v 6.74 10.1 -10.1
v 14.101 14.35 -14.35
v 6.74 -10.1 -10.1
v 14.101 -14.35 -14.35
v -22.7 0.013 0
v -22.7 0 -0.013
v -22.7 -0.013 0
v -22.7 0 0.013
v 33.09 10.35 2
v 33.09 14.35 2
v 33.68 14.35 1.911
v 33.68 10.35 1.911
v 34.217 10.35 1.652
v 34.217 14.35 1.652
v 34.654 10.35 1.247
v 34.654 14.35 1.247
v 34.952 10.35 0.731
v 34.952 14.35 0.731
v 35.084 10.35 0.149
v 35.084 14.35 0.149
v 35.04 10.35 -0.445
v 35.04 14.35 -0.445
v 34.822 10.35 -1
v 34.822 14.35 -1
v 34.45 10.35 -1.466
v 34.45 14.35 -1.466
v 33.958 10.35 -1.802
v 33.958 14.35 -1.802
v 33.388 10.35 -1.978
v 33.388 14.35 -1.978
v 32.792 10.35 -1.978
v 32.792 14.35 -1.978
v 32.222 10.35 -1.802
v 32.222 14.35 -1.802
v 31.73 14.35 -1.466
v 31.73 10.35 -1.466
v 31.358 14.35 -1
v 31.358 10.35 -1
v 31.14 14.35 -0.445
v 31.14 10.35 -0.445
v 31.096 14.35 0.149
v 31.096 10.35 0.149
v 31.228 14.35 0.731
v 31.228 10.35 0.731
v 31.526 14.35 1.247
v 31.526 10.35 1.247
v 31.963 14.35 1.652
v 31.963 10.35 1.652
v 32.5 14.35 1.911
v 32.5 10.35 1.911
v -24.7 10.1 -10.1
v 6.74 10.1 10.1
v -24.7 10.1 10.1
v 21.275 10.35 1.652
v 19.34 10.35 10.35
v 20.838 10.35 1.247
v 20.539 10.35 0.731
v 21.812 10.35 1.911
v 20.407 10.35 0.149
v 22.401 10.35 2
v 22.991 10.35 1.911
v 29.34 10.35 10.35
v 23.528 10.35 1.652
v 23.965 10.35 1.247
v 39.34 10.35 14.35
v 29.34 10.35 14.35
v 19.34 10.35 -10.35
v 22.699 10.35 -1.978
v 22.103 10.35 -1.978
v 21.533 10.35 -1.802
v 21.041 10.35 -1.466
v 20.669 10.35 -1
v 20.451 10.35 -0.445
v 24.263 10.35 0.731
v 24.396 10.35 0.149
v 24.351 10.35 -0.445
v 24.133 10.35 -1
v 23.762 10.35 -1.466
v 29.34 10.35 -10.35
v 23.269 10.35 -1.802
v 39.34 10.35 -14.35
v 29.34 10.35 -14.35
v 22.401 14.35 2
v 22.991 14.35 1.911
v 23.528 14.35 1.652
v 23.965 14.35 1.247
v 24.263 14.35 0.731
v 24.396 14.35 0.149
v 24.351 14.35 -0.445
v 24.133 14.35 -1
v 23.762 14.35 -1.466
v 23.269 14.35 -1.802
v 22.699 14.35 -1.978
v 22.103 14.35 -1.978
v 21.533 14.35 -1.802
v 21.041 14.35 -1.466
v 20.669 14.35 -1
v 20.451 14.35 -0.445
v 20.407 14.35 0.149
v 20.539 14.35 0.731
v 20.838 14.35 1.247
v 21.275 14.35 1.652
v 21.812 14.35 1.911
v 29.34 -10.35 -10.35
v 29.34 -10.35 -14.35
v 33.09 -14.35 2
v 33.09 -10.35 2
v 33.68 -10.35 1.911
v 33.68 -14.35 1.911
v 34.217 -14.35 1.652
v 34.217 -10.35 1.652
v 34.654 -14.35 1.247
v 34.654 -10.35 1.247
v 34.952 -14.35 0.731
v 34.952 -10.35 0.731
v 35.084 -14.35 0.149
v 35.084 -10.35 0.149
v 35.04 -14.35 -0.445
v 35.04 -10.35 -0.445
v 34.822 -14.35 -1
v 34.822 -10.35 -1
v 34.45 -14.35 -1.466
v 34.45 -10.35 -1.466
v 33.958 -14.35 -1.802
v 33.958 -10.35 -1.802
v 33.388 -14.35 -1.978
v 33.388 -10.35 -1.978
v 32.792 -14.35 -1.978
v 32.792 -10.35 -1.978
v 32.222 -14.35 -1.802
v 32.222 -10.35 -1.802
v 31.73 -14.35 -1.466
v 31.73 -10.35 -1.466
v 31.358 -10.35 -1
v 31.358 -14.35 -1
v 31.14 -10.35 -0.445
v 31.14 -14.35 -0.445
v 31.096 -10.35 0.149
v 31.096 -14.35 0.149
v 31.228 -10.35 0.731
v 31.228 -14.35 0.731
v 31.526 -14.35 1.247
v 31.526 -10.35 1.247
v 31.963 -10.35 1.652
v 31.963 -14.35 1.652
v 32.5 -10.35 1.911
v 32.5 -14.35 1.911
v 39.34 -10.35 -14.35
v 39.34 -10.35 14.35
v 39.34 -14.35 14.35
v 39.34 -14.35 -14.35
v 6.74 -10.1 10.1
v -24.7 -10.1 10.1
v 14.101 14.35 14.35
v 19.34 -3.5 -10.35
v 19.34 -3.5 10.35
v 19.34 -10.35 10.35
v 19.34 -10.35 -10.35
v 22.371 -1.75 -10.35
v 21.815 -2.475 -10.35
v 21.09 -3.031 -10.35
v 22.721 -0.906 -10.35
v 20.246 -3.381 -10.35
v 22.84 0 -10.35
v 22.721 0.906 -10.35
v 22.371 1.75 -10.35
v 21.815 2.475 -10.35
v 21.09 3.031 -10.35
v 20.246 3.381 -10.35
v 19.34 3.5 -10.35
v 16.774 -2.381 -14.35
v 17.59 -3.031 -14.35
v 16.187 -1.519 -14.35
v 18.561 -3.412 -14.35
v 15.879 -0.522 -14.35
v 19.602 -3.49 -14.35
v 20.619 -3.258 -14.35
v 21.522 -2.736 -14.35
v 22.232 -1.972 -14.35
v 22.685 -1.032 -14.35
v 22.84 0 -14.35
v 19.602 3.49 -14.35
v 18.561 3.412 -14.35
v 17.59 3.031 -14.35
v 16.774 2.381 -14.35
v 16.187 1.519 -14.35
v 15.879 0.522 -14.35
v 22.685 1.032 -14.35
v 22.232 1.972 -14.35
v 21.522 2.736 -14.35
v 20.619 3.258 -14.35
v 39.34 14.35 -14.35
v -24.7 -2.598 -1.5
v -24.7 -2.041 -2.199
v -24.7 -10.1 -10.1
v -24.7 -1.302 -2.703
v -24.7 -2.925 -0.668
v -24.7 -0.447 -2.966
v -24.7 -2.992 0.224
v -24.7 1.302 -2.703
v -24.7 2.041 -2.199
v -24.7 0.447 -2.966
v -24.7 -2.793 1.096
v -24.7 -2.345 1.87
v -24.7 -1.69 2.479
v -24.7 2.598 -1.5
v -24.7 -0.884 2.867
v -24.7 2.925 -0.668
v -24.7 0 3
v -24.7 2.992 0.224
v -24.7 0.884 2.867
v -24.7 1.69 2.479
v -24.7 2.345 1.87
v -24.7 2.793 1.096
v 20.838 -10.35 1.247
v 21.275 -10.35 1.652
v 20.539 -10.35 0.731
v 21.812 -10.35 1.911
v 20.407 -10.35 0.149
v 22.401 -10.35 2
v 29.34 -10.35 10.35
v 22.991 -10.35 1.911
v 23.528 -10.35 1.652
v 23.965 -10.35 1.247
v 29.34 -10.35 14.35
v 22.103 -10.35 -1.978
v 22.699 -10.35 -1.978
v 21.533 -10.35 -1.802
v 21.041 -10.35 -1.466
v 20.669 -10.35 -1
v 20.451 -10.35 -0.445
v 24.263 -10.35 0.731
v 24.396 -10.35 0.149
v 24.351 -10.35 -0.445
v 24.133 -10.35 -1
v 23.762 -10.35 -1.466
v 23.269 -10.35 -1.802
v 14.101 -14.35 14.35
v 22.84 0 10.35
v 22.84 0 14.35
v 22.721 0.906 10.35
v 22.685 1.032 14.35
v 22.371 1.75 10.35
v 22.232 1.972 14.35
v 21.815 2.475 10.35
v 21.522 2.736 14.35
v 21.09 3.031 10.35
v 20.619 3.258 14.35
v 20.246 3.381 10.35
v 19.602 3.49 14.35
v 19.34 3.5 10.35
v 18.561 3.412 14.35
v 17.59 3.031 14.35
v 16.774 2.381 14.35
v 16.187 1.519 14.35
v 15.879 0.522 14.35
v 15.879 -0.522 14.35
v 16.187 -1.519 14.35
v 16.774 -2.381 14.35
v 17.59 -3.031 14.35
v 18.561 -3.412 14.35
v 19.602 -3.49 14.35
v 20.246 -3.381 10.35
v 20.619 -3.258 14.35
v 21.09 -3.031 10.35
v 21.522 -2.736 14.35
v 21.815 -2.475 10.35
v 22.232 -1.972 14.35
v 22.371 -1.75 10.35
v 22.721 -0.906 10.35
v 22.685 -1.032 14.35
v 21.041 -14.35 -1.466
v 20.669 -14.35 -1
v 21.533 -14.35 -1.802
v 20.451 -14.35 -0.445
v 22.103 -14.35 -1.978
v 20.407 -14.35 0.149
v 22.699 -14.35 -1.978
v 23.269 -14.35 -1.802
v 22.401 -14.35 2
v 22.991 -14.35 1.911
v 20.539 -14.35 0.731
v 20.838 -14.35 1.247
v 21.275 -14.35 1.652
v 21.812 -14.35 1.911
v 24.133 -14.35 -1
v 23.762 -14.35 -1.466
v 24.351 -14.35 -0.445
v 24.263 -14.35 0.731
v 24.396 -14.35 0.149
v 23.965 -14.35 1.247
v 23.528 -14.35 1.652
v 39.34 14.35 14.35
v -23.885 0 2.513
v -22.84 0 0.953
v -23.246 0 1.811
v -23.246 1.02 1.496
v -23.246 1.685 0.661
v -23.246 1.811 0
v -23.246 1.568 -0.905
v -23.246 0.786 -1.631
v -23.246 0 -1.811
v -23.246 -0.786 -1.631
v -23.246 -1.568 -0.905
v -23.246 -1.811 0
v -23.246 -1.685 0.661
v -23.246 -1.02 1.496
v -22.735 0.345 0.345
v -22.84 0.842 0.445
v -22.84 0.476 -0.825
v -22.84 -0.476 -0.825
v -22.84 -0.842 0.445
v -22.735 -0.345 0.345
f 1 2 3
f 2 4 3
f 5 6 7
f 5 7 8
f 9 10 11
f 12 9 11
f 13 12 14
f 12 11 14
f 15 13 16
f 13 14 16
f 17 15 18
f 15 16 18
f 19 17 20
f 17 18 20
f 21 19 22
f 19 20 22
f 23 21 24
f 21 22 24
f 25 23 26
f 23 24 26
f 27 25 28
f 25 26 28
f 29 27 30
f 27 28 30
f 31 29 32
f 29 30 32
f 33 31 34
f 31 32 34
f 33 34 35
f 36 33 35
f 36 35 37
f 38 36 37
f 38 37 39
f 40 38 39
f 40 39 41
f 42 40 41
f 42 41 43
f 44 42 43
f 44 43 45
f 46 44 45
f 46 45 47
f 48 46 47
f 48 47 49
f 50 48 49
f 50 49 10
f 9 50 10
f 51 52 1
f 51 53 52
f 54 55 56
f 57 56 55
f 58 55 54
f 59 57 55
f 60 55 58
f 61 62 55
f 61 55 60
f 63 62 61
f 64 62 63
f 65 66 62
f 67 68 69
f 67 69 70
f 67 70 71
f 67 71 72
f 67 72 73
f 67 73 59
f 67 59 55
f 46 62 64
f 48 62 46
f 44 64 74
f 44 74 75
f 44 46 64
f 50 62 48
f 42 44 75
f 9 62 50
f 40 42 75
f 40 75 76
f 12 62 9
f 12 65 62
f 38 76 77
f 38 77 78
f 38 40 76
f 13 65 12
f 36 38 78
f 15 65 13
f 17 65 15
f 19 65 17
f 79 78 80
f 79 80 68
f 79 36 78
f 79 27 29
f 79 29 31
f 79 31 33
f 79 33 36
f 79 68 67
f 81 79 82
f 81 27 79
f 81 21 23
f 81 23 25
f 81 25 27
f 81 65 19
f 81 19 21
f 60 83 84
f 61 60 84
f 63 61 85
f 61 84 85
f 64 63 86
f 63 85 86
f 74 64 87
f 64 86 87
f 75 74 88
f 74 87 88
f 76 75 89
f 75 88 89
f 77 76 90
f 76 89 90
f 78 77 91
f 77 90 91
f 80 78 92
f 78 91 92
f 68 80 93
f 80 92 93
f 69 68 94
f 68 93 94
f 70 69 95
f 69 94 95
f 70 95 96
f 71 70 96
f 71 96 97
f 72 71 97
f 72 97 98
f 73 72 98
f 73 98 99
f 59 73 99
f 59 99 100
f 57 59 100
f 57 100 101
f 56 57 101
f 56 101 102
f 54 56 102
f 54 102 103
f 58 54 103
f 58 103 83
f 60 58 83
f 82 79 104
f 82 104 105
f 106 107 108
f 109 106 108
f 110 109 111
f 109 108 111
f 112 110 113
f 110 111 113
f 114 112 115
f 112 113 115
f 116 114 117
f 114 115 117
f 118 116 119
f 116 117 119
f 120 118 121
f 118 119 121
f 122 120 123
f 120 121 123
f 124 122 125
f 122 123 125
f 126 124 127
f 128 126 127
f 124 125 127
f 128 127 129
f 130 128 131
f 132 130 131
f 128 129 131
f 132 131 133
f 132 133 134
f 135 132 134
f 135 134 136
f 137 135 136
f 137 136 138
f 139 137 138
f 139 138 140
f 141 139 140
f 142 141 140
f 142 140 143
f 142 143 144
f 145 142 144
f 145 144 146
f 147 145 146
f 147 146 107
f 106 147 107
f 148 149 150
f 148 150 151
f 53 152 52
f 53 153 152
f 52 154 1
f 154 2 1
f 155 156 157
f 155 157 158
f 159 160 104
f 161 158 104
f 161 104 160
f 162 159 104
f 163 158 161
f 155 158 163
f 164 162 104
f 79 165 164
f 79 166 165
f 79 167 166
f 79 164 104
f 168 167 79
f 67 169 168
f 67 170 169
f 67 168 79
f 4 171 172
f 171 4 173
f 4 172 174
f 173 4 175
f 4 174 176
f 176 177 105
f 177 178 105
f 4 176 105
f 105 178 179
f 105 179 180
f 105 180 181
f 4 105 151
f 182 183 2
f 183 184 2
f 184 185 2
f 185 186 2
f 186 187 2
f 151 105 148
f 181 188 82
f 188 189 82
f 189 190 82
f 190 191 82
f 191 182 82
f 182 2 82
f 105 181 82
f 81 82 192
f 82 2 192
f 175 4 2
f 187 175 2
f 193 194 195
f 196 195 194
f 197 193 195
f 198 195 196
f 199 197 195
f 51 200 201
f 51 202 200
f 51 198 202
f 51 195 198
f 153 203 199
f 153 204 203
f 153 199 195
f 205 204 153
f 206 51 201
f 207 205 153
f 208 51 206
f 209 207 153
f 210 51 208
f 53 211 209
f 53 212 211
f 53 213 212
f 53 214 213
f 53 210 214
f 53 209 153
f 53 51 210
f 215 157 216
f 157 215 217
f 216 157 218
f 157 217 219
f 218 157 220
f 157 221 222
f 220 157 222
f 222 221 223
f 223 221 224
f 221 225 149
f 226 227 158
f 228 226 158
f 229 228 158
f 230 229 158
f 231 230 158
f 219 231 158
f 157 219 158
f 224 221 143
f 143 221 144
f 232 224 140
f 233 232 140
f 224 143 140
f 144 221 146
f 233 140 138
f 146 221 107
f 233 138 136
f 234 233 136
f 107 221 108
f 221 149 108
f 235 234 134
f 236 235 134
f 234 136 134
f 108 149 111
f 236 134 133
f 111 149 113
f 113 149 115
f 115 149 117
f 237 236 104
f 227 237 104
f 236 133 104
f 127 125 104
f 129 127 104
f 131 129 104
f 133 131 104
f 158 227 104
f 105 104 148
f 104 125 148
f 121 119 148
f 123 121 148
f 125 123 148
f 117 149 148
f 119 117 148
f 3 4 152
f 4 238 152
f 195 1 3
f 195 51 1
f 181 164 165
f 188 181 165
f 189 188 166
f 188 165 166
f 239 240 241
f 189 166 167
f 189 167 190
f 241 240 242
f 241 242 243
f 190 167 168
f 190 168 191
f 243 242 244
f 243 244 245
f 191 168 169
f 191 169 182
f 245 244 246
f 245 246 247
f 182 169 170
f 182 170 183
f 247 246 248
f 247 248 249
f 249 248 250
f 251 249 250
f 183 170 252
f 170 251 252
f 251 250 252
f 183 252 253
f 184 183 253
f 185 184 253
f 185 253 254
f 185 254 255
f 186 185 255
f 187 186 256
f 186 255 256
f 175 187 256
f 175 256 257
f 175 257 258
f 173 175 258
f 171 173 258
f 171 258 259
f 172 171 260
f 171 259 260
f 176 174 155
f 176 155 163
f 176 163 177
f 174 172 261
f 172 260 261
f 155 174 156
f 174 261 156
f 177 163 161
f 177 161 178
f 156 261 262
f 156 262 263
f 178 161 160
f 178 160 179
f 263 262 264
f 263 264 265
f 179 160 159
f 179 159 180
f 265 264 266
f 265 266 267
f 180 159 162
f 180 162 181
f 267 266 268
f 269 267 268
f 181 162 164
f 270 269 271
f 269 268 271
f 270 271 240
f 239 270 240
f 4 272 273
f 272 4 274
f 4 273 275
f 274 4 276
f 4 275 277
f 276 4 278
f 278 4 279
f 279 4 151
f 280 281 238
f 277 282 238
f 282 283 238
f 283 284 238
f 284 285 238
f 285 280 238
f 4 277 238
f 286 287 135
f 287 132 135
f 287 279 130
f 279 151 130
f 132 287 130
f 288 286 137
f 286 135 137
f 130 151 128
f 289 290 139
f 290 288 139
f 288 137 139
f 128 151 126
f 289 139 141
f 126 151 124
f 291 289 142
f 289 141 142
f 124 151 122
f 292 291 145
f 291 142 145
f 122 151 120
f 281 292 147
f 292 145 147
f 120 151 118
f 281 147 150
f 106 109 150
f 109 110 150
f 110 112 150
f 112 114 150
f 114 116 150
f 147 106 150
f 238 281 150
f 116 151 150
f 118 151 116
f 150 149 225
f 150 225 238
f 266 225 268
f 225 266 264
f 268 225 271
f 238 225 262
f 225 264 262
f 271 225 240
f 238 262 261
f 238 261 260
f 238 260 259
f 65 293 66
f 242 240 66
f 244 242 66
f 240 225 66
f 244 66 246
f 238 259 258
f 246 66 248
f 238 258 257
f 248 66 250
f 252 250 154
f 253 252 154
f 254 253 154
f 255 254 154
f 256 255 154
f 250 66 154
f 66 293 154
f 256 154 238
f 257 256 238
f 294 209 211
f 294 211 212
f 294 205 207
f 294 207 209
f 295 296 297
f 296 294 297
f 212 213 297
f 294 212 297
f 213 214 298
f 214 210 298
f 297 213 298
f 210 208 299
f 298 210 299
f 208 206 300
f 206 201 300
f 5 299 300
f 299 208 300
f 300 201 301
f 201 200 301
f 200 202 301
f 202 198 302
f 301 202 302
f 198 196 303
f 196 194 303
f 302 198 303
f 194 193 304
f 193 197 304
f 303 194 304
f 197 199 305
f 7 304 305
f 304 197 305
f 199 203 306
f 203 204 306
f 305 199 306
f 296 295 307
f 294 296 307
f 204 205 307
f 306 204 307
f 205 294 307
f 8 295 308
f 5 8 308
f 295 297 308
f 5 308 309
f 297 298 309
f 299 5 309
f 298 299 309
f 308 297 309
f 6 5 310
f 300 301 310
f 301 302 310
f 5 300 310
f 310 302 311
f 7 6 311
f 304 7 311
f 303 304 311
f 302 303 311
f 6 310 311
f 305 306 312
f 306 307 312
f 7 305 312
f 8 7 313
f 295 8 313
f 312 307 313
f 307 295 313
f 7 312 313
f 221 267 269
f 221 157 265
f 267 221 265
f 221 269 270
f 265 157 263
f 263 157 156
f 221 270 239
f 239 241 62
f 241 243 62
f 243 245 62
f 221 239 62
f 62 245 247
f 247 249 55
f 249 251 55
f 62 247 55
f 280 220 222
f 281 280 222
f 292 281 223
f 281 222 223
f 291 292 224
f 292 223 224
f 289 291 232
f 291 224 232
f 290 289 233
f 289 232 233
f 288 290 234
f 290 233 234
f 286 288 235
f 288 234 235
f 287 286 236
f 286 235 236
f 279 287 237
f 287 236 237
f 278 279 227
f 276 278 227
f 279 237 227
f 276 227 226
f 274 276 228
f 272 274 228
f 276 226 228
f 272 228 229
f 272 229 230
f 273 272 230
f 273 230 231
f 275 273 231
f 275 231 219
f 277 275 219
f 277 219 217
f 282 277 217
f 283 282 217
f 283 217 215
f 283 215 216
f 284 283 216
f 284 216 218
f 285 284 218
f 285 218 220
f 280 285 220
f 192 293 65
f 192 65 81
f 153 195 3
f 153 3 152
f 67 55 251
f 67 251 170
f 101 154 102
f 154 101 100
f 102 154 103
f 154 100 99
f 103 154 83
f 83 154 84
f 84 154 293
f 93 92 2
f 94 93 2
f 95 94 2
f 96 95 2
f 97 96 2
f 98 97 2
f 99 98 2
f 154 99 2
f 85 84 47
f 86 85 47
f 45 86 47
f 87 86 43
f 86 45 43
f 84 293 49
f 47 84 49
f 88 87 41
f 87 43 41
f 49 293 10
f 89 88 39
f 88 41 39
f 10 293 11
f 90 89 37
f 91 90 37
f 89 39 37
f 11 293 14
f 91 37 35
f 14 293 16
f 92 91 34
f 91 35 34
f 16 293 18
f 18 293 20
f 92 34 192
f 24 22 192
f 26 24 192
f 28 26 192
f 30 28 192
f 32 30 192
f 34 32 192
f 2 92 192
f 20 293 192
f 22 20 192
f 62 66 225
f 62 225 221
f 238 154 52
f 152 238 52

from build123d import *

# Parameters (mm, degrees)
SKETCH1_W                 = 20
SKETCH1_H                 = 20
BOSS_EXTRUDE1_DEPTH       = 20
SKETCH2_W                 = 20
SKETCH2_H                 = 40.2
BOSS_EXTRUDE2_DEPTH       = 64.7
SKETCH3_W                 = 40.9
SKETCH3_H                 = 20.8
CUT_EXTRUDE1_DEPTH        = 90.320210479
SKETCH4_W                 = 11.9
SKETCH4_H                 = 40.2
CUT_EXTRUDE2_DEPTH        = 90.320210479
SKETCH5_R                 = 2.35
CUT_EXTRUDE3_DEPTH        = 10
SKETCH6_R                 = 2.35
CUT_EXTRUDE4_DEPTH        = 10
CHAMFER1_SIZE             = 1
SKETCH7_W                 = 20
SKETCH7_H                 = 10.1
BOSS_EXTRUDE4_DEPTH       = 4.7
SKETCH9_W                 = 20
SKETCH9_H                 = 20
BOSS_EXTRUDE5_DEPTH       = 24.7
SKETCH10_R                = 3
CUT_EXTRUDE5_DEPTH        = 2
FILLET1_R                 = 3.23
SKETCH11_W                = 20.2
SKETCH11_H                = 20.2
SKETCH11_W_2              = 20
SKETCH11_H_2              = 20
BOSS_EXTRUDE6_DEPTH       = 40
SKETCH12_R                = 3.35
BOSS_EXTRUDE7_DEPTH       = 0.1
BOSS_EXTRUDE8_DEPTH       = 0.1
SKETCH14_W                = 27.84115355
SKETCH14_H                = 50.628320261
CUT_EXTRUDE6_DEPTH        = 57.5
BOSS_EXTRUDE10_DEPTH      = 10
BOSS_EXTRUDE10_DEPTH_BACK = 0.96
SKETCH18_W                = 28.7
SKETCH18_H                = 28.7
SKETCH18_W_2              = 20.7
SKETCH18_H_2              = 20.7
SKETCH19_W                = 20.7
SKETCH19_H                = 20.7
BOSS_EXTRUDE11_DEPTH      = 4.04
SKETCH21_W                = 20.7
SKETCH21_H                = 20.7
BOSS_EXTRUDE13_DEPTH      = 0.96
SKETCH22_W                = 28.7
SKETCH22_H                = 28.7
SKETCH22_W_2              = 20.7
SKETCH22_H_2              = 20.7
BOSS_EXTRUDE14_DEPTH      = 14.04
CHAMFER2_SIZE             = 4.387862046
CHAMFER2_SIZE_2           = 7.6
SKETCH24_R                = 3.5
CUT_EXTRUDE7_DEPTH        = 51.76660418
SKETCH25_W                = 4
SKETCH25_H                = 20.7
CUT_EXTRUDE8_DEPTH        = 10
SKETCH26_R                = 2
CUT_EXTRUDE9_DEPTH        = 51.76660418


with BuildPart() as part:
    # Sketch1 → Boss-Extrude1 (new body)
    with BuildSketch(Plane(origin=(0, 0, 0), x_dir=(0, 0, -1), z_dir=(1, 0, 0))):
        Rectangle(SKETCH1_W, SKETCH1_H)
    extrude(amount=BOSS_EXTRUDE1_DEPTH)

    # Sketch2 → Boss-Extrude2 (add)
    with BuildSketch(Plane(origin=(20, 0, 0), x_dir=(0, 0, -1), z_dir=(1, 0, 0))):
        Rectangle(SKETCH2_W, SKETCH2_H)
    extrude(amount=BOSS_EXTRUDE2_DEPTH)

    # Sketch3 → Cut-Extrude1 (cut, through all)
    with BuildSketch(Plane.XY.offset(10)):
        with Locations((52.35, 0)):
            Rectangle(SKETCH3_W, SKETCH3_H)
    extrude(amount=-CUT_EXTRUDE1_DEPTH, mode=Mode.SUBTRACT)

    # Sketch4 → Cut-Extrude2 (cut, through all)
    with BuildSketch(Plane.XY.offset(10)):
        with Locations((78.75, 0)):
            Rectangle(SKETCH4_W, SKETCH4_H)
    extrude(amount=-CUT_EXTRUDE2_DEPTH, mode=Mode.SUBTRACT)

    # Sketch5 → Cut-Extrude3 (cut)
    with BuildSketch(Plane.XY.offset(10)):
        with Locations((28.01, 4.9)):
            Circle(SKETCH5_R)
        with Locations(Location((28.01, -4.9, 0), (0, 0, 180))):
            Circle(SKETCH5_R)
    extrude(amount=-CUT_EXTRUDE3_DEPTH, mode=Mode.SUBTRACT)

    # Sketch6 → Cut-Extrude4 (cut)
    with BuildSketch(Plane(origin=(72.8, 0, 0), x_dir=(0, 0, -1), z_dir=(1, 0, 0))):
        with Locations((0, -15.25)):
            Circle(SKETCH6_R)
        with Locations(Location((0, 15.25, 0), (0, 0, 180))):
            Circle(SKETCH6_R)
    extrude(amount=-CUT_EXTRUDE4_DEPTH, mode=Mode.SUBTRACT)

    # Chamfer1
    chamfer1_edges = [part.edges().sort_by_distance(p)[0] for p in [
        (25.66, 4.9, 10),
        (30.36, -4.9, 10),
        (72.8, -15.25, 2.35),
        (72.8, 15.25, -2.35),
    ]]
    chamfer(chamfer1_edges, length=CHAMFER1_SIZE)

    # Sketch7 → Boss-Extrude4 (add)
    with BuildSketch(Plane.ZY.offset(-20)):
        with Locations((0, 15.05)):
            Rectangle(SKETCH7_W, SKETCH7_H)
        with Locations((0, -15.05)):
            Rectangle(SKETCH7_W, SKETCH7_H)
    extrude(amount=BOSS_EXTRUDE4_DEPTH)

    # Sketch9 → Boss-Extrude5 (add)
    with BuildSketch(Plane.ZY):
        Rectangle(SKETCH9_W, SKETCH9_H)
    extrude(amount=BOSS_EXTRUDE5_DEPTH)

    # Sketch10 → Cut-Extrude5 (cut)
    with BuildSketch(Plane.ZY.offset(24.7)):
        Circle(SKETCH10_R)
    extrude(amount=-CUT_EXTRUDE5_DEPTH, mode=Mode.SUBTRACT)

    # Fillet1
    # the kernel refuses this fillet: 3.23 mm, written as the material it adds along each edge
    with BuildSketch(Plane(origin=(-22.7, 0, 0), x_dir=(0, 0, 1), z_dir=(0, -1, 0))) as fillet1_piece_1:
        with BuildLine():
            CenterArc((0.013363095, 3.23), FILLET1_R, 270, 67.616447755)
            Line((0.013363095, 0), (0.013363095, -0.0646))
            Line((0.013363095, -0.0646), (3, -0.0646))
            Line((3, -0.0646), (3.0646, 0))
            ThreePointArc((3.0646, 0), (3.0646, 1), (3.059732738, 1.9754))
            Line((3.059732738, 1.9754), (3, 2))
        make_face()
    revolve(axis=Axis((-22.7, 0, 0), (-1, 0, 0)))

    # Sketch11 → Boss-Extrude6 (add)
    with BuildSketch(Plane.ZY.offset(24.7)):
        Rectangle(SKETCH11_W, SKETCH11_H)
        Rectangle(SKETCH11_W_2, SKETCH11_H_2, mode=Mode.SUBTRACT)
    extrude(amount=-BOSS_EXTRUDE6_DEPTH)

    # Sketch12 → Boss-Extrude7 (add)
    with BuildSketch(Plane.XY.offset(10)):
        Polygon((72.8, 20.1), (15.3, 20.1), (15.3, -20.1), (72.8, -20.1), (72.8, -10.4), (31.9, -10.4), (31.9, 10.4), (72.8, 10.4), align=None)
        with Locations(Location((28.01, 4.9, 0), (0, 0, 180))):
            Circle(SKETCH12_R, mode=Mode.SUBTRACT)
        with Locations(Location((28.01, -4.9, 0), (0, 0, 180))):
            Circle(SKETCH12_R, mode=Mode.SUBTRACT)
    extrude(amount=BOSS_EXTRUDE7_DEPTH)

    # Sketch13 → Boss-Extrude8 (add)
    with BuildSketch(Plane(origin=(0, 0, -10), x_dir=(-1, 0, 0), z_dir=(0, 0, -1))):
        Polygon((-72.8, -20.1), (-15.3, -20.1), (-15.3, 20.1), (-72.8, 20.1), (-72.8, 10.4), (-31.9, 10.4), (-31.9, -10.4), (-72.8, -10.4), align=None)
    extrude(amount=BOSS_EXTRUDE8_DEPTH)

    # Sketch14 → Cut-Extrude6 (cut)
    with BuildSketch(Plane(origin=(72.8, 0, 0), x_dir=(0, 0, -1), z_dir=(1, 0, 0))):
        with Locations((-1.3978782, 0.184476051)):
            Rectangle(SKETCH14_W, SKETCH14_H)
    extrude(amount=-CUT_EXTRUDE6_DEPTH, mode=Mode.SUBTRACT)

    # Sketch19 → Boss-Extrude11 (add)
    with BuildSketch(Plane(origin=(15.3, 0, 0), x_dir=(0, 0, -1), z_dir=(1, 0, 0))):
        Rectangle(SKETCH19_W, SKETCH19_H)
    extrude(amount=BOSS_EXTRUDE11_DEPTH)



with BuildPart() as body_2:
    # Sketch18 → Boss-Extrude10 (new, two sides: drawn at the far end of the back side and taken through both)
    with BuildSketch(Plane(origin=(15.3, 0, 0), x_dir=(0, 0, -1), z_dir=(1, 0, 0)).offset(-BOSS_EXTRUDE10_DEPTH_BACK)):
        Rectangle(SKETCH18_W, SKETCH18_H)
        Rectangle(SKETCH18_W_2, SKETCH18_H_2, mode=Mode.SUBTRACT)
    extrude(amount=BOSS_EXTRUDE10_DEPTH + BOSS_EXTRUDE10_DEPTH_BACK)


with BuildPart() as part_1:
    add(part.part)

    add(body_2.part)  # Boss-Extrude13 merges body 2
    # Sketch21 → Boss-Extrude13 (add)
    with BuildSketch(Plane.ZY.offset(-15.3)):
        Rectangle(SKETCH21_W, SKETCH21_H)
    extrude(amount=BOSS_EXTRUDE13_DEPTH)

    # Sketch22 → Boss-Extrude14 (add)
    with BuildSketch(Plane(origin=(25.3, 0, 0), x_dir=(0, 0, -1), z_dir=(1, 0, 0))):
        Rectangle(SKETCH22_W, SKETCH22_H)
        Rectangle(SKETCH22_W_2, SKETCH22_H_2, mode=Mode.SUBTRACT)
    extrude(amount=BOSS_EXTRUDE14_DEPTH)

    # Chamfer2
    # the kernel refuses this chamfer: 7.6, 4.387862046 mm, written as the material it adds along each edge
    with BuildSketch(Plane(origin=(14.34, -10.1, 10.1), x_dir=(0.05789386240267072, -0.9983227437537925, 0), z_dir=(0, 0, -1))) as chamfer2_piece_1_section:
        Polygon((CHAMFER2_SIZE * 0.998322743718, CHAMFER2_SIZE * 0.0578938624006), (-CHAMFER2_SIZE_2 * 0.0578938624027, CHAMFER2_SIZE_2 * 0.998322743754), (0, 0), align=None)
    chamfer2_piece_1 = extrude(amount=20.2, mode=Mode.PRIVATE)
    chamfer2_piece_1 = split(chamfer2_piece_1, bisect_by=Plane(origin=(11.775225799, -14.35, 0), z_dir=(0, 1, 0)), keep=Keep.TOP, mode=Mode.PRIVATE)
    add(chamfer2_piece_1)
    with BuildSketch(Plane(origin=(14.34, -10.1, -10.1), x_dir=(0.05789386240267072, 0, -0.9983227437537925), z_dir=(0, 1, 0))) as chamfer2_piece_2_section:
        Polygon((CHAMFER2_SIZE * 0.998322743718, CHAMFER2_SIZE * 0.0578938624006), (-CHAMFER2_SIZE_2 * 0.0578938624027, CHAMFER2_SIZE_2 * 0.998322743754), (0, 0), align=None)
    chamfer2_piece_2 = extrude(amount=20.2, mode=Mode.PRIVATE)
    chamfer2_piece_2 = split(chamfer2_piece_2, bisect_by=Plane(origin=(11.775225799, 0, -14.35), z_dir=(0, 0, 1)), keep=Keep.TOP, mode=Mode.PRIVATE)
    add(chamfer2_piece_2)
    with BuildSketch(Plane(origin=(14.34, 10.1, -10.1), x_dir=(0.05789386240267072, 0.9983227437537925, 0), z_dir=(0, 0, 1))) as chamfer2_piece_3_section:
        Polygon((CHAMFER2_SIZE * 0.998322743718, CHAMFER2_SIZE * 0.0578938624006), (-CHAMFER2_SIZE_2 * 0.0578938624027, CHAMFER2_SIZE_2 * 0.998322743754), (0, 0), align=None)
    chamfer2_piece_3 = extrude(amount=20.2, mode=Mode.PRIVATE)
    chamfer2_piece_3 = split(chamfer2_piece_3, bisect_by=Plane(origin=(11.775225799, 14.35, 0), z_dir=(0, -1, 0)), keep=Keep.TOP, mode=Mode.PRIVATE)
    add(chamfer2_piece_3)
    with BuildSketch(Plane(origin=(14.34, 10.1, 10.1), x_dir=(0.05789386240267072, 0, 0.9983227437537925), z_dir=(0, -1, 0))) as chamfer2_piece_4_section:
        Polygon((CHAMFER2_SIZE * 0.998322743718, CHAMFER2_SIZE * 0.0578938624006), (-CHAMFER2_SIZE_2 * 0.0578938624027, CHAMFER2_SIZE_2 * 0.998322743754), (0, 0), align=None)
    chamfer2_piece_4 = extrude(amount=20.2, mode=Mode.PRIVATE)
    chamfer2_piece_4 = split(chamfer2_piece_4, bisect_by=Plane(origin=(11.775225799, 0, 14.35), z_dir=(0, 0, -1)), keep=Keep.TOP, mode=Mode.PRIVATE)
    add(chamfer2_piece_4)
    with BuildSketch(Plane(origin=(14.34, 10.1, 10.1), x_dir=(0.05789386240267072, 0, 0.9983227437537925), z_dir=(0, -1, 0))) as chamfer2_piece_5a_section:
        Polygon((CHAMFER2_SIZE * 0.998322743718, CHAMFER2_SIZE * 0.0578938624006), (-CHAMFER2_SIZE_2 * 0.0578938624027, CHAMFER2_SIZE_2 * 0.998322743754), (0, 0), align=None)
    chamfer2_piece_5a = extrude(amount=39.861851735, mode=Mode.PRIVATE)
    chamfer2_piece_5a = split(chamfer2_piece_5a, bisect_by=Plane(origin=(11.775225799, -14.35, 11.489810432), z_dir=(0, 1, 0)), keep=Keep.TOP, mode=Mode.PRIVATE)
    chamfer2_piece_5a = split(chamfer2_piece_5a, bisect_by=Plane(origin=(11.775225799, -12.225, 14.35), z_dir=(0, 0, -1)), keep=Keep.TOP, mode=Mode.PRIVATE)
    chamfer2_piece_5a = split(chamfer2_piece_5a, bisect_by=Plane(origin=(11.775225799, -10.1, 11.489810432), z_dir=(0, -1, 0)), keep=Keep.TOP, mode=Mode.PRIVATE)
    with BuildSketch(Plane(origin=(14.34, -10.1, 29.761851735), x_dir=(0.05789386240267072, -0.9983227437537925, 0), z_dir=(0, 0, -1))) as chamfer2_piece_5b_section:
        Polygon((CHAMFER2_SIZE * 0.998322743718, CHAMFER2_SIZE * 0.0578938624006), (-CHAMFER2_SIZE_2 * 0.0578938624027, CHAMFER2_SIZE_2 * 0.998322743754), (0, 0), align=None)
    chamfer2_piece_5b = extrude(amount=39.861851735, mode=Mode.PRIVATE)
    chamfer2_piece_5b = split(chamfer2_piece_5b, bisect_by=Plane(origin=(11.775225799, -14.35, 12.225), z_dir=(0, 1, 0)), keep=Keep.TOP, mode=Mode.PRIVATE)
    chamfer2_piece_5b = split(chamfer2_piece_5b, bisect_by=Plane(origin=(11.775225799, -11.489810432, 14.35), z_dir=(0, 0, -1)), keep=Keep.TOP, mode=Mode.PRIVATE)
    chamfer2_piece_5b = split(chamfer2_piece_5b, bisect_by=Plane(origin=(11.775225799, -11.489810432, 10.1), z_dir=(0, 0, 1)), keep=Keep.TOP, mode=Mode.PRIVATE)
    chamfer2_piece_5 = chamfer2_piece_5a & chamfer2_piece_5b
    add(chamfer2_piece_5)
    with BuildSketch(Plane(origin=(14.34, -10.1, 10.1), x_dir=(0.05789386240267072, -0.9983227437537925, 0), z_dir=(0, 0, -1))) as chamfer2_piece_6a_section:
        Polygon((CHAMFER2_SIZE * 0.998322743718, CHAMFER2_SIZE * 0.0578938624006), (-CHAMFER2_SIZE_2 * 0.0578938624027, CHAMFER2_SIZE_2 * 0.998322743754), (0, 0), align=None)
    chamfer2_piece_6a = extrude(amount=39.861851735, mode=Mode.PRIVATE)
    chamfer2_piece_6a = split(chamfer2_piece_6a, bisect_by=Plane(origin=(11.775225799, -11.489810432, -14.35), z_dir=(0, 0, 1)), keep=Keep.TOP, mode=Mode.PRIVATE)
    chamfer2_piece_6a = split(chamfer2_piece_6a, bisect_by=Plane(origin=(11.775225799, -14.35, -12.225), z_dir=(0, 1, 0)), keep=Keep.TOP, mode=Mode.PRIVATE)
    chamfer2_piece_6a = split(chamfer2_piece_6a, bisect_by=Plane(origin=(11.775225799, -11.489810432, -10.1), z_dir=(0, 0, -1)), keep=Keep.TOP, mode=Mode.PRIVATE)
    with BuildSketch(Plane(origin=(14.34, -29.761851735, -10.1), x_dir=(0.05789386240267072, 0, -0.9983227437537925), z_dir=(0, 1, 0))) as chamfer2_piece_6b_section:
        Polygon((CHAMFER2_SIZE * 0.998322743718, CHAMFER2_SIZE * 0.0578938624006), (-CHAMFER2_SIZE_2 * 0.0578938624027, CHAMFER2_SIZE_2 * 0.998322743754), (0, 0), align=None)
    chamfer2_piece_6b = extrude(amount=39.861851735, mode=Mode.PRIVATE)
    chamfer2_piece_6b = split(chamfer2_piece_6b, bisect_by=Plane(origin=(11.775225799, -12.225, -14.35), z_dir=(0, 0, 1)), keep=Keep.TOP, mode=Mode.PRIVATE)
    chamfer2_piece_6b = split(chamfer2_piece_6b, bisect_by=Plane(origin=(11.775225799, -14.35, -11.489810432), z_dir=(0, 1, 0)), keep=Keep.TOP, mode=Mode.PRIVATE)
    chamfer2_piece_6b = split(chamfer2_piece_6b, bisect_by=Plane(origin=(11.775225799, -10.1, -11.489810432), z_dir=(0, -1, 0)), keep=Keep.TOP, mode=Mode.PRIVATE)
    chamfer2_piece_6 = chamfer2_piece_6a & chamfer2_piece_6b
    add(chamfer2_piece_6)
    with BuildSketch(Plane(origin=(14.34, -10.1, -10.1), x_dir=(0.05789386240267072, 0, -0.9983227437537925), z_dir=(0, 1, 0))) as chamfer2_piece_7a_section:
        Polygon((CHAMFER2_SIZE * 0.998322743718, CHAMFER2_SIZE * 0.0578938624006), (-CHAMFER2_SIZE_2 * 0.0578938624027, CHAMFER2_SIZE_2 * 0.998322743754), (0, 0), align=None)
    chamfer2_piece_7a = extrude(amount=39.861851735, mode=Mode.PRIVATE)
    chamfer2_piece_7a = split(chamfer2_piece_7a, bisect_by=Plane(origin=(11.775225799, 12.225, -14.35), z_dir=(0, 0, 1)), keep=Keep.TOP, mode=Mode.PRIVATE)
    chamfer2_piece_7a = split(chamfer2_piece_7a, bisect_by=Plane(origin=(11.775225799, 14.35, -11.489810432), z_dir=(0, -1, 0)), keep=Keep.TOP, mode=Mode.PRIVATE)
    chamfer2_piece_7a = split(chamfer2_piece_7a, bisect_by=Plane(origin=(11.775225799, 10.1, -11.489810432), z_dir=(0, 1, 0)), keep=Keep.TOP, mode=Mode.PRIVATE)
    with BuildSketch(Plane(origin=(14.34, 10.1, -29.761851735), x_dir=(0.05789386240267072, 0.9983227437537925, 0), z_dir=(0, 0, 1))) as chamfer2_piece_7b_section:
        Polygon((CHAMFER2_SIZE * 0.998322743718, CHAMFER2_SIZE * 0.0578938624006), (-CHAMFER2_SIZE_2 * 0.0578938624027, CHAMFER2_SIZE_2 * 0.998322743754), (0, 0), align=None)
    chamfer2_piece_7b = extrude(amount=39.861851735, mode=Mode.PRIVATE)
    chamfer2_piece_7b = split(chamfer2_piece_7b, bisect_by=Plane(origin=(11.775225799, 11.489810432, -14.35), z_dir=(0, 0, 1)), keep=Keep.TOP, mode=Mode.PRIVATE)
    chamfer2_piece_7b = split(chamfer2_piece_7b, bisect_by=Plane(origin=(11.775225799, 14.35, -12.225), z_dir=(0, -1, 0)), keep=Keep.TOP, mode=Mode.PRIVATE)
    chamfer2_piece_7b = split(chamfer2_piece_7b, bisect_by=Plane(origin=(11.775225799, 11.489810432, -10.1), z_dir=(0, 0, -1)), keep=Keep.TOP, mode=Mode.PRIVATE)
    chamfer2_piece_7 = chamfer2_piece_7a & chamfer2_piece_7b
    add(chamfer2_piece_7)
    with BuildSketch(Plane(origin=(14.34, 29.761851735, 10.1), x_dir=(0.05789386240267072, 0, 0.9983227437537925), z_dir=(0, -1, 0))) as chamfer2_piece_8a_section:
        Polygon((CHAMFER2_SIZE * 0.998322743718, CHAMFER2_SIZE * 0.0578938624006), (-CHAMFER2_SIZE_2 * 0.0578938624027, CHAMFER2_SIZE_2 * 0.998322743754), (0, 0), align=None)
    chamfer2_piece_8a = extrude(amount=39.861851735, mode=Mode.PRIVATE)
    chamfer2_piece_8a = split(chamfer2_piece_8a, bisect_by=Plane(origin=(11.775225799, 12.225, 14.35), z_dir=(0, 0, -1)), keep=Keep.TOP, mode=Mode.PRIVATE)
    chamfer2_piece_8a = split(chamfer2_piece_8a, bisect_by=Plane(origin=(11.775225799, 14.35, 11.489810432), z_dir=(0, -1, 0)), keep=Keep.TOP, mode=Mode.PRIVATE)
    chamfer2_piece_8a = split(chamfer2_piece_8a, bisect_by=Plane(origin=(11.775225799, 10.1, 11.489810432), z_dir=(0, 1, 0)), keep=Keep.TOP, mode=Mode.PRIVATE)
    with BuildSketch(Plane(origin=(14.34, 10.1, -10.1), x_dir=(0.05789386240267072, 0.9983227437537925, 0), z_dir=(0, 0, 1))) as chamfer2_piece_8b_section:
        Polygon((CHAMFER2_SIZE * 0.998322743718, CHAMFER2_SIZE * 0.0578938624006), (-CHAMFER2_SIZE_2 * 0.0578938624027, CHAMFER2_SIZE_2 * 0.998322743754), (0, 0), align=None)
    chamfer2_piece_8b = extrude(amount=39.861851735, mode=Mode.PRIVATE)
    chamfer2_piece_8b = split(chamfer2_piece_8b, bisect_by=Plane(origin=(11.775225799, 11.489810432, 14.35), z_dir=(0, 0, -1)), keep=Keep.TOP, mode=Mode.PRIVATE)
    chamfer2_piece_8b = split(chamfer2_piece_8b, bisect_by=Plane(origin=(11.775225799, 14.35, 12.225), z_dir=(0, -1, 0)), keep=Keep.TOP, mode=Mode.PRIVATE)
    chamfer2_piece_8b = split(chamfer2_piece_8b, bisect_by=Plane(origin=(11.775225799, 11.489810432, 10.1), z_dir=(0, 0, 1)), keep=Keep.TOP, mode=Mode.PRIVATE)
    chamfer2_piece_8 = chamfer2_piece_8a & chamfer2_piece_8b
    add(chamfer2_piece_8)

    # Sketch24 → Cut-Extrude7 (cut, through all)
    with BuildSketch(Plane.XY.offset(14.35)):
        with Locations((19.34, 0)):
            Circle(SKETCH24_R)
    extrude(amount=-CUT_EXTRUDE7_DEPTH, mode=Mode.SUBTRACT)

    # Sketch25 → Cut-Extrude8 (cut)
    with BuildSketch(Plane(origin=(39.34, 0, 0), x_dir=(0, 0, -1), z_dir=(1, 0, 0))):
        with Locations((-12.35, 0)):
            Rectangle(SKETCH25_W, SKETCH25_H)
        with Locations((12.35, 0)):
            Rectangle(SKETCH25_W, SKETCH25_H)
    extrude(amount=-CUT_EXTRUDE8_DEPTH, mode=Mode.SUBTRACT)

    # Sketch26 → Cut-Extrude9 (cut, through all)
    with BuildSketch(Plane(origin=(0, 14.35, 0), x_dir=(1, 0, 0), z_dir=(0, 1, 0))):
        with Locations(Location((33.09, 0, 0), (0, 0, 270))):
            Circle(SKETCH26_R)
        with Locations(Location((22.401215932, 0, 0), (0, 0, 270))):
            Circle(SKETCH26_R)
    extrude(amount=-CUT_EXTRUDE9_DEPTH, mode=Mode.SUBTRACT)


solid = part_1.part
